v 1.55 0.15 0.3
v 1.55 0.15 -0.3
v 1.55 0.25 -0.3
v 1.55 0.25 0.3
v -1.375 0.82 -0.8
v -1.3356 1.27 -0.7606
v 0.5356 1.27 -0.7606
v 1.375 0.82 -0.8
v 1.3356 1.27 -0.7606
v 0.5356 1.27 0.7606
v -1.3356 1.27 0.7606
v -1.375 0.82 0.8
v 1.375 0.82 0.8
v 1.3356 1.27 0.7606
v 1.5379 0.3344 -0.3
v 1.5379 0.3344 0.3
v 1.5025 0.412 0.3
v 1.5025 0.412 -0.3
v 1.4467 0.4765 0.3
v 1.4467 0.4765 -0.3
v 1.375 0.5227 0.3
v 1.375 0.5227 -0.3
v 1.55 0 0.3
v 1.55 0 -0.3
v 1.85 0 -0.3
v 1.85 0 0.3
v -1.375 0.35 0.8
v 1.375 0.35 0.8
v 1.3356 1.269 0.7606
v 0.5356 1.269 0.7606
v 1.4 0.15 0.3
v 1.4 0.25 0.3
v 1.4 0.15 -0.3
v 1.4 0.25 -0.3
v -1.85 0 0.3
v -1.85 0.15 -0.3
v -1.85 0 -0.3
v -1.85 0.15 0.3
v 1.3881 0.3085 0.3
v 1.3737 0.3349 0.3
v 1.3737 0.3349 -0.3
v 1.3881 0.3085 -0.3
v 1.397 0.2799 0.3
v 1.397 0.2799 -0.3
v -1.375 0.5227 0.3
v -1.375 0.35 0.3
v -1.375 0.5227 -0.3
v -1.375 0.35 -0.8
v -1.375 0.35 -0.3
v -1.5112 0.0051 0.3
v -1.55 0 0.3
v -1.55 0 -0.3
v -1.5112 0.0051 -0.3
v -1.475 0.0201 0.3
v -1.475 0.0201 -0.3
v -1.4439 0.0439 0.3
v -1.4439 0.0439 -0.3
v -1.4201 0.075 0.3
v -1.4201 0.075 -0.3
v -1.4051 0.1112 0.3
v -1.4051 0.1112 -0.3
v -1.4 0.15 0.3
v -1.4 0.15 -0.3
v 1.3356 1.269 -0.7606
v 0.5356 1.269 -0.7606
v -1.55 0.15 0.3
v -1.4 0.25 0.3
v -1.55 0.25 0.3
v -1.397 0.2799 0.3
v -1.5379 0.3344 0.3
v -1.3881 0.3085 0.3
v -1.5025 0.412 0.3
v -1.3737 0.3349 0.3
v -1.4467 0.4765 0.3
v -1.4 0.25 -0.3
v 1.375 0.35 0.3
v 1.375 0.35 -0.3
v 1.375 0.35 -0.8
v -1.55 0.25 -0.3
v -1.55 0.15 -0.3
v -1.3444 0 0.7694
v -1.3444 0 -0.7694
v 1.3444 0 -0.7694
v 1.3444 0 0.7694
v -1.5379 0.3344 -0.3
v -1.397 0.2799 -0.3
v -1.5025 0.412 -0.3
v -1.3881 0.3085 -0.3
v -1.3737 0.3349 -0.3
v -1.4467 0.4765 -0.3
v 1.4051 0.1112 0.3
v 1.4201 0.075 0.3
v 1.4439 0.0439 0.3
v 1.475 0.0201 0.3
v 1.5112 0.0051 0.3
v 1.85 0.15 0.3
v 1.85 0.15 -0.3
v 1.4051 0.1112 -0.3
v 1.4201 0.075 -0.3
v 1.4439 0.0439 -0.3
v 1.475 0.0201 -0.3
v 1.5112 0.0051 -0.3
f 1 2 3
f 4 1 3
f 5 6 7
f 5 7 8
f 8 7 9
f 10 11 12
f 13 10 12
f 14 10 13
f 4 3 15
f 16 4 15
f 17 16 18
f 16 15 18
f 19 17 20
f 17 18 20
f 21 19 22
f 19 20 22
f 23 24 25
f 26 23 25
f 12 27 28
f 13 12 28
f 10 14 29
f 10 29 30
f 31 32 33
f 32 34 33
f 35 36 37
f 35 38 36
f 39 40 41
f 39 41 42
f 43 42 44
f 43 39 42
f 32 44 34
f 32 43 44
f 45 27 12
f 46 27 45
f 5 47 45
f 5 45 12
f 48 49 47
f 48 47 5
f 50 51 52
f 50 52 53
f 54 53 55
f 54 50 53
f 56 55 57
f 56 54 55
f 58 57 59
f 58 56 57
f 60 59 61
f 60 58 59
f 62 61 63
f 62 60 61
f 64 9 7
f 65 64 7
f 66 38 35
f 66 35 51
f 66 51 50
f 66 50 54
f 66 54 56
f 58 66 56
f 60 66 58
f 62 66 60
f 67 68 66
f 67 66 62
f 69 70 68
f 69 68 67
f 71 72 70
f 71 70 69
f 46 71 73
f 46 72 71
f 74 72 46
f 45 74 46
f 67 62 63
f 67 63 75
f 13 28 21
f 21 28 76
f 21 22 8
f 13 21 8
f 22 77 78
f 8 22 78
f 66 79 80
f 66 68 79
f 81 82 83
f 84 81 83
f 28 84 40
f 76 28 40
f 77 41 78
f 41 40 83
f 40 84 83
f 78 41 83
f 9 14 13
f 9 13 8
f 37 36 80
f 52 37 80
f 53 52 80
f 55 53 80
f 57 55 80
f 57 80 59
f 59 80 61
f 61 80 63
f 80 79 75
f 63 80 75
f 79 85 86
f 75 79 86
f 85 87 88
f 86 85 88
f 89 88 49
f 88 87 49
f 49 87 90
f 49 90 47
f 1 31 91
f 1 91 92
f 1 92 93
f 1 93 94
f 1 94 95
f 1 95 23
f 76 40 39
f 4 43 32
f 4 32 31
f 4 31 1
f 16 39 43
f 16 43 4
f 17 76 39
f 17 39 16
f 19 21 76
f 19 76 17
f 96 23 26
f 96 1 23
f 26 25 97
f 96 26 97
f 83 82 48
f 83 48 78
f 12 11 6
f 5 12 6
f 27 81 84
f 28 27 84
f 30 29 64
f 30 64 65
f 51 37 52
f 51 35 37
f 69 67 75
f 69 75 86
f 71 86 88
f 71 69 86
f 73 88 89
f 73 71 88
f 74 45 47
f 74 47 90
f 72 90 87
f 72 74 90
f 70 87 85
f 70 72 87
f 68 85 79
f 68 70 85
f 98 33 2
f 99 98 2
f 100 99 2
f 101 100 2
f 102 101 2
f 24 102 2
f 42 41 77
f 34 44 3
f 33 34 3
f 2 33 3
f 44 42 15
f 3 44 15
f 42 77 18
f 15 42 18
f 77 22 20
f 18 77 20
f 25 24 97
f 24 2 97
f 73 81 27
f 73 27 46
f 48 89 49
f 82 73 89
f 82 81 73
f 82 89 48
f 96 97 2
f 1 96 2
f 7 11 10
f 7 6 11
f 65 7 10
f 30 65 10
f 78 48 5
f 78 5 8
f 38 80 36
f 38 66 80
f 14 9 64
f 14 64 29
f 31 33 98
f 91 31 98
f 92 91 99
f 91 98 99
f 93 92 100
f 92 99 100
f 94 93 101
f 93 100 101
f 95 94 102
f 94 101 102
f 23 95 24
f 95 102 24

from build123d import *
from OCP.BRepFilletAPI import BRepFilletAPI_MakeChamfer

# Parameters (mm, degrees)
SKETCH1_W                     = 2.75
SKETCH1_H                     = 1.6
BASE_EXTRUDE_DEPTH            = 1.27
CHAMFER1_SIZE                 = 0.45
CHAMFER1_SIZE2                = 0.039369899
CHAMFER3_SIZE                 = 0.35
CHAMFER3_SIZE2                = 0.030621032
BOSS_EXTRUDE_THIN2_DEPTH      = 0.3
BOSS_EXTRUDE_THIN2_DEPTH_BACK = 0.3
SKETCH3_W                     = 0.8
SKETCH3_H                     = 1.521260202
CUT_EXTRUDE1_DEPTH            = 0.001


with BuildPart() as part:
    # Sketch1 → Base-Extrude (new body)
    with BuildSketch(Plane(origin=(0, 0, 0), x_dir=(1, 0, 0), z_dir=(0, 1, 0))):
        Rectangle(SKETCH1_W, SKETCH1_H)
    extrude(amount=BASE_EXTRUDE_DEPTH)

    # Chamfer1: one chamfer whose edges measure the first distance from different faces: ONE call of the kernel's chamfer builder (chamfer() names one face for all edges)
    chamfer1_edges_1 = [part.edges().sort_by_distance(p)[0] for p in [
        (1.375, 1.27, 0),
    ]]
    chamfer1_side_1 = [part.faces().sort_by_distance(p)[0] for p in [
        (1.375, 0.635, 0),
    ]]
    chamfer1_edges_2 = [part.edges().sort_by_distance(p)[0] for p in [
        (0, 1.27, -0.8),
    ]]
    chamfer1_side_2 = [part.faces().sort_by_distance(p)[0] for p in [
        (0, 0.635, -0.8),
    ]]
    chamfer1_edges_3 = [part.edges().sort_by_distance(p)[0] for p in [
        (-1.375, 1.27, 0),
    ]]
    chamfer1_side_3 = [part.faces().sort_by_distance(p)[0] for p in [
        (-1.375, 0.635, 0),
    ]]
    chamfer1_edges_4 = [part.edges().sort_by_distance(p)[0] for p in [
        (0, 1.27, 0.8),
    ]]
    chamfer1_side_4 = [part.faces().sort_by_distance(p)[0] for p in [
        (0, 0.635, 0.8),
    ]]
    chamfer1 = BRepFilletAPI_MakeChamfer(part.part.solid().wrapped)
    for e in chamfer1_edges_1:
        chamfer1.Add(CHAMFER1_SIZE, CHAMFER1_SIZE2, e.wrapped, chamfer1_side_1[0].wrapped)  # the first distance lies on this face
    for e in chamfer1_edges_2:
        chamfer1.Add(CHAMFER1_SIZE, CHAMFER1_SIZE2, e.wrapped, chamfer1_side_2[0].wrapped)  # the first distance lies on this face
    for e in chamfer1_edges_3:
        chamfer1.Add(CHAMFER1_SIZE, CHAMFER1_SIZE2, e.wrapped, chamfer1_side_3[0].wrapped)  # the first distance lies on this face
    for e in chamfer1_edges_4:
        chamfer1.Add(CHAMFER1_SIZE, CHAMFER1_SIZE2, e.wrapped, chamfer1_side_4[0].wrapped)  # the first distance lies on this face
    add(Compound.cast(chamfer1.Shape()), mode=Mode.REPLACE)

    # Chamfer3: one chamfer whose edges measure the first distance from different faces: ONE call of the kernel's chamfer builder (chamfer() names one face for all edges)
    chamfer3_edges_1 = [part.edges().sort_by_distance(p)[0] for p in [
        (0, 0, -0.8),
    ]]
    chamfer3_side_1 = [part.faces().sort_by_distance(p)[0] for p in [
        (0, 0.41, -0.8),
    ]]
    chamfer3_edges_2 = [part.edges().sort_by_distance(p)[0] for p in [
        (1.375, 0, 0),
    ]]
    chamfer3_side_2 = [part.faces().sort_by_distance(p)[0] for p in [
        (1.375, 0.41, 0),
    ]]
    chamfer3_edges_3 = [part.edges().sort_by_distance(p)[0] for p in [
        (0, 0, 0.8),
    ]]
    chamfer3_side_3 = [part.faces().sort_by_distance(p)[0] for p in [
        (0, 0.41, 0.8),
    ]]
    chamfer3_edges_4 = [part.edges().sort_by_distance(p)[0] for p in [
        (-1.375, 0, 0),
    ]]
    chamfer3_side_4 = [part.faces().sort_by_distance(p)[0] for p in [
        (-1.375, 0.41, 0),
    ]]
    chamfer3 = BRepFilletAPI_MakeChamfer(part.part.solid().wrapped)
    for e in chamfer3_edges_1:
        chamfer3.Add(CHAMFER3_SIZE, CHAMFER3_SIZE2, e.wrapped, chamfer3_side_1[0].wrapped)  # the first distance lies on this face
    for e in chamfer3_edges_2:
        chamfer3.Add(CHAMFER3_SIZE, CHAMFER3_SIZE2, e.wrapped, chamfer3_side_2[0].wrapped)  # the first distance lies on this face
    for e in chamfer3_edges_3:
        chamfer3.Add(CHAMFER3_SIZE, CHAMFER3_SIZE2, e.wrapped, chamfer3_side_3[0].wrapped)  # the first distance lies on this face
    for e in chamfer3_edges_4:
        chamfer3.Add(CHAMFER3_SIZE, CHAMFER3_SIZE2, e.wrapped, chamfer3_side_4[0].wrapped)  # the first distance lies on this face
    add(Compound.cast(chamfer3.Shape()), mode=Mode.REPLACE)

    # Sketch2 → Boss-Extrude-Thin2 (add, two sides)
    with BuildSketch(Plane.XY) as boss_extrude_thin2_sk:
        with BuildLine():
            Line((-1.85, 0), (-1.55, 0))
            ThreePointArc((-1.55, 0), (-1.443933983, 0.043933983), (-1.4, 0.15))
            Line((-1.4, 0.15), (-1.4, 0.25))
            ThreePointArc((-1.4, 0.25), (-1.356066017, 0.356066017), (-1.25, 0.4))
            Line((-1.25, 0.4), (1.25, 0.4))
            ThreePointArc((1.25, 0.4), (1.356066017, 0.356066017), (1.4, 0.25))
            Line((1.4, 0.25), (1.4, 0.15))
            ThreePointArc((1.4, 0.15), (1.443933983, 0.043933983), (1.55, 0))
            Line((1.55, 0), (1.85, 0))
            Line((1.85, 0), (1.85, 0.15))
            Line((1.85, 0.15), (1.55, 0.15))
            Line((1.55, 0.15), (1.55, 0.25))
            ThreePointArc((1.55, 0.25), (1.462132034, 0.462132034), (1.25, 0.55))
            Line((1.25, 0.55), (-1.25, 0.55))
            ThreePointArc((-1.25, 0.55), (-1.462132034, 0.462132034), (-1.55, 0.25))
            Line((-1.55, 0.25), (-1.55, 0.15))
            Line((-1.55, 0.15), (-1.85, 0.15))
            Line((-1.85, 0.15), (-1.85, 0))
        make_face()
    extrude(amount=BOSS_EXTRUDE_THIN2_DEPTH)
    extrude(boss_extrude_thin2_sk.sketch, amount=-BOSS_EXTRUDE_THIN2_DEPTH_BACK)

    # Sketch3 → Cut-Extrude1 (cut)
    with BuildSketch(Plane(origin=(0, 1.27, 0), x_dir=(-1, 0, 0), z_dir=(0, 1, 0))):
        with Locations((-0.935630101, 0)):
            Rectangle(SKETCH3_W, SKETCH3_H)
    extrude(amount=-CUT_EXTRUDE1_DEPTH, mode=Mode.SUBTRACT)


solid = part.part
